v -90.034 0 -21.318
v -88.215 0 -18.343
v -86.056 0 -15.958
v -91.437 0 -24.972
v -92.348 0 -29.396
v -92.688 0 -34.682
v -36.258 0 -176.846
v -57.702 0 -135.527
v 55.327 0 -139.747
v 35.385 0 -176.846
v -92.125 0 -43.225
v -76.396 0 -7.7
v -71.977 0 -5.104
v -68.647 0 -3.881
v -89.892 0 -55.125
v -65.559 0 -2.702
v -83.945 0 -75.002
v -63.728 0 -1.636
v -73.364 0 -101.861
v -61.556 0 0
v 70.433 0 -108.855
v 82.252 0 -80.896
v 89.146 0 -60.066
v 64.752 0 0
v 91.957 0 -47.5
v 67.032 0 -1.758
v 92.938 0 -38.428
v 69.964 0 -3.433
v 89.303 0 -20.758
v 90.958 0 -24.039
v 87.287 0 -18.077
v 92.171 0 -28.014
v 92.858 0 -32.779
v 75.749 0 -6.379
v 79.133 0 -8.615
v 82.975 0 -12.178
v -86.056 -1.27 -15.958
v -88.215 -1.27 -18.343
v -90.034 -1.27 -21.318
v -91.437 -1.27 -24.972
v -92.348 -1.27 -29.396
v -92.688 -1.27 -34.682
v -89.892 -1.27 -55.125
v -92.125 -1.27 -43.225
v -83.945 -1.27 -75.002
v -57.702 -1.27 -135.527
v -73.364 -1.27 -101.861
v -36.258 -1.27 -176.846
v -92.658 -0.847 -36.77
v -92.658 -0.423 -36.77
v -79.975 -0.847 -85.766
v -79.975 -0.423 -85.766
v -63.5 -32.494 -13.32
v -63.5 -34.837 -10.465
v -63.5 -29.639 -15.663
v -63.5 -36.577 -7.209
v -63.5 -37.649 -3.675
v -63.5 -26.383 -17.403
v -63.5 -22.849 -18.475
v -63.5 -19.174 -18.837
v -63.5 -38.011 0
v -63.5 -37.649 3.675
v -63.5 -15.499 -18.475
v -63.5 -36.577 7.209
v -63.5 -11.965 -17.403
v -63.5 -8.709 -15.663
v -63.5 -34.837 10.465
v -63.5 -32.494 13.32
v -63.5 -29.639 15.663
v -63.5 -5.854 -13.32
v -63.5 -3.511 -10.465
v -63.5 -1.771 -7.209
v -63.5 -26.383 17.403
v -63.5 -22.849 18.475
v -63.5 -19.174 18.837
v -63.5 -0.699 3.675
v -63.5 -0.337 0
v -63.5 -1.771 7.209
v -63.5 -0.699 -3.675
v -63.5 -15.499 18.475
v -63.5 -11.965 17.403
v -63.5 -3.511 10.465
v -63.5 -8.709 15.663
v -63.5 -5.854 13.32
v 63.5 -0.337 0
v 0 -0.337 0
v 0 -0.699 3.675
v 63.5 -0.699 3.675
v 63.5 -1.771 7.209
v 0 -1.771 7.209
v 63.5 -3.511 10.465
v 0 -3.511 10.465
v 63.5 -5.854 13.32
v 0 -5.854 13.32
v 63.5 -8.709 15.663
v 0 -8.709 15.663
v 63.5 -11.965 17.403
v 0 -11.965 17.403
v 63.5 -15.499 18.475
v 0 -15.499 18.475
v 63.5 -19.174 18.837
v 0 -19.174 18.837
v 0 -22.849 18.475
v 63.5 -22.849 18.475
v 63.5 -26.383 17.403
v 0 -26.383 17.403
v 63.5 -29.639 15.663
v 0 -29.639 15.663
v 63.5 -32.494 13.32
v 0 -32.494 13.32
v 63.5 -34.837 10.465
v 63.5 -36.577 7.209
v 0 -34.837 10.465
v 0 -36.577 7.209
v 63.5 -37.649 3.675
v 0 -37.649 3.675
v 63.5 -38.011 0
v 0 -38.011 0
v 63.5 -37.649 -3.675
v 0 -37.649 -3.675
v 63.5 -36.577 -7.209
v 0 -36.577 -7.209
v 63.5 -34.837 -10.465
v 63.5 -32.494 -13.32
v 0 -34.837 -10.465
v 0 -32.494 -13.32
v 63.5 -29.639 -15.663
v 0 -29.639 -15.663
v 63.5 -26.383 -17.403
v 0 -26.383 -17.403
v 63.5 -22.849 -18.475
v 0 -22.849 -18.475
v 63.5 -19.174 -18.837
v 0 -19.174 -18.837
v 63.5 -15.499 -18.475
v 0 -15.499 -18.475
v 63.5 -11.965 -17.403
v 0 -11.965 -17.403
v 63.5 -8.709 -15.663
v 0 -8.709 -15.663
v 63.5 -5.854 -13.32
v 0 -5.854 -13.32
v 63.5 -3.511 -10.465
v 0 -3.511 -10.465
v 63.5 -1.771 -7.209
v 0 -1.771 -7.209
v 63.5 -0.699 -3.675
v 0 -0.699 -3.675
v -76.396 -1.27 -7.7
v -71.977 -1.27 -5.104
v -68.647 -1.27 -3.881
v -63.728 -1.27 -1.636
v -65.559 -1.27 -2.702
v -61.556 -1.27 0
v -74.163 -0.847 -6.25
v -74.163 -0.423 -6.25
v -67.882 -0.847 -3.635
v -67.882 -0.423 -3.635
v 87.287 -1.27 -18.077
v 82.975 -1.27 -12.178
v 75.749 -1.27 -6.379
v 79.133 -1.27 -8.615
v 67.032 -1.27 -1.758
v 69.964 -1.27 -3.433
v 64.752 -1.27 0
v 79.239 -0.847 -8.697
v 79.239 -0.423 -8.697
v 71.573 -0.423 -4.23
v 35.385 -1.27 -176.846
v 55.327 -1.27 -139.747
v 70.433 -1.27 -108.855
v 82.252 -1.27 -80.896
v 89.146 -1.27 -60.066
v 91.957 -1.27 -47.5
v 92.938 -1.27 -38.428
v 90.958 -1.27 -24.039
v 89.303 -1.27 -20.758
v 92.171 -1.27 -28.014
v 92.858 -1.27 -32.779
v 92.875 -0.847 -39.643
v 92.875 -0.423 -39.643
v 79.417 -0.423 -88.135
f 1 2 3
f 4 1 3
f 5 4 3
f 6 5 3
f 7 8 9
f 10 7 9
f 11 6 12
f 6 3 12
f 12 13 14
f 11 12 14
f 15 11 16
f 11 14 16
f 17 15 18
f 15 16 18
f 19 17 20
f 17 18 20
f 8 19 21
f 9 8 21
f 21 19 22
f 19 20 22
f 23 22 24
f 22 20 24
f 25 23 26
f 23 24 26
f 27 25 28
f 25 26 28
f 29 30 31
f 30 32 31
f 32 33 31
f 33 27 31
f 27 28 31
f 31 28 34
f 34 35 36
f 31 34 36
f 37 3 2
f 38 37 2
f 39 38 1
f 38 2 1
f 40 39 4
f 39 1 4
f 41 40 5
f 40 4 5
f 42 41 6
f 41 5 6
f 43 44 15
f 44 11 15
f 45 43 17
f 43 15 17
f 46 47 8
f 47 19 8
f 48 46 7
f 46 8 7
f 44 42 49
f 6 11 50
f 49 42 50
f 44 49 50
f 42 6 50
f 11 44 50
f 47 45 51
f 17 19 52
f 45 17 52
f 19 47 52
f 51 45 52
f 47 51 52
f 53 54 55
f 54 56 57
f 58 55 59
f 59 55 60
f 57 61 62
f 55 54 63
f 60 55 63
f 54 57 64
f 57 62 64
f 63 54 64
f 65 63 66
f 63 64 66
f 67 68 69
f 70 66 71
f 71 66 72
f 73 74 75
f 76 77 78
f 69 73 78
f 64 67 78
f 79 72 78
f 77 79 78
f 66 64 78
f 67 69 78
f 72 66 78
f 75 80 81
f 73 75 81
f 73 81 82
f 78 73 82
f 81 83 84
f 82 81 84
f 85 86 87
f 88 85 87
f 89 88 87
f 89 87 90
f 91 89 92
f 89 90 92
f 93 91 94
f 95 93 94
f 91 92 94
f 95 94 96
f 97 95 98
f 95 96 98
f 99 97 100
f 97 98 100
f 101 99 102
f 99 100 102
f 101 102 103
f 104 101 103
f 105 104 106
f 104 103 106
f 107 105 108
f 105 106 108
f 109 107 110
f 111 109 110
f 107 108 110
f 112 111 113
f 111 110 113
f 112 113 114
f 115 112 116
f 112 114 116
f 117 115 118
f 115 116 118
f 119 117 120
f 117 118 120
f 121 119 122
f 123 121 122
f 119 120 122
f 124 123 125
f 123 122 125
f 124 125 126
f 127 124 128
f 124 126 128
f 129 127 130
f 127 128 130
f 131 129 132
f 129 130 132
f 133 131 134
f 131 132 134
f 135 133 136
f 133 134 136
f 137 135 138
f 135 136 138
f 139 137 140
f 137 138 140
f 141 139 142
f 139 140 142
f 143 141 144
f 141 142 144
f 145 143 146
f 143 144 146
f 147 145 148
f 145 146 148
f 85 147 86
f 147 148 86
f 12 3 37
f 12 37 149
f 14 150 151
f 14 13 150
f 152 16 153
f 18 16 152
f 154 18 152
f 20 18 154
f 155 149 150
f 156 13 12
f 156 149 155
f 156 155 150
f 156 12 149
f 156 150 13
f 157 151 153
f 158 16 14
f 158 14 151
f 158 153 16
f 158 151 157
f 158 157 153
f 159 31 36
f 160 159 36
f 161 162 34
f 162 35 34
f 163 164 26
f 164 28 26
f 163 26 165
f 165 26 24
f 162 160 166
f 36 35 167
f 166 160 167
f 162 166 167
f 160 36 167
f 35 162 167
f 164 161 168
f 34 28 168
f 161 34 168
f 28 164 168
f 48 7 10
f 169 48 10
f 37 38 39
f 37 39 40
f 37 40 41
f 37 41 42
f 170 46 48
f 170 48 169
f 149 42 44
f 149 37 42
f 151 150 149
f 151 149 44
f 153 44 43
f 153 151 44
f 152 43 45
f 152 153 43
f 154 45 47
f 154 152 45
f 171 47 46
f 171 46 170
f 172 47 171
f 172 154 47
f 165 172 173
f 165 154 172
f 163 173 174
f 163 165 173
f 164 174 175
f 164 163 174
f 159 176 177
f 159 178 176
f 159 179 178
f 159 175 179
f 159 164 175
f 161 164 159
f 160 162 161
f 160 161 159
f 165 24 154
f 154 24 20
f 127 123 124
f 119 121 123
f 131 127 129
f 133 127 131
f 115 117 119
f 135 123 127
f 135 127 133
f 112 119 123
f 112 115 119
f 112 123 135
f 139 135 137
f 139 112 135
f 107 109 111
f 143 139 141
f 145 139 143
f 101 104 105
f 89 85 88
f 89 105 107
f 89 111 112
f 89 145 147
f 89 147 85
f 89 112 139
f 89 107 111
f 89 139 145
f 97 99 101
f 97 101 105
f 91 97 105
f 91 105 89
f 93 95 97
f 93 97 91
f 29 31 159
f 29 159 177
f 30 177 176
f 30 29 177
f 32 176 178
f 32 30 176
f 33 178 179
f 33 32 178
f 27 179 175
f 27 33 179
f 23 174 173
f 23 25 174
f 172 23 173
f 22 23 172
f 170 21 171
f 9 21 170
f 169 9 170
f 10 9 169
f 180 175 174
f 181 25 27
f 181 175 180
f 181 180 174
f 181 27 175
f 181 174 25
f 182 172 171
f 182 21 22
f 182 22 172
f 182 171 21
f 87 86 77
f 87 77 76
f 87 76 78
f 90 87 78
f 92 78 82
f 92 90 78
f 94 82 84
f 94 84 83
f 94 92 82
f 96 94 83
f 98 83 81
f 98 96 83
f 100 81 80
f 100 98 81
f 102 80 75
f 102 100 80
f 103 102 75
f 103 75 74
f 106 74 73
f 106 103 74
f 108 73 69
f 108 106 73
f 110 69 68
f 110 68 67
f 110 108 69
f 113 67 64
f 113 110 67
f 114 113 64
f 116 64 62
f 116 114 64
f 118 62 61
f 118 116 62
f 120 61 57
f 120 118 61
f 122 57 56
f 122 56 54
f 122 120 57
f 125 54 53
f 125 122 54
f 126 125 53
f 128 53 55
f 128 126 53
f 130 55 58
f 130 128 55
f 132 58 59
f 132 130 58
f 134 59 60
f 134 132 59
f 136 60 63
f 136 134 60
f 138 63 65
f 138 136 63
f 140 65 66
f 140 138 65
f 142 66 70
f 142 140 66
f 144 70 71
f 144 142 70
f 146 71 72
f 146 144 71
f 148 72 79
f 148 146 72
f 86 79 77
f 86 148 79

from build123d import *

# Parameters (mm, degrees)
F0_R      = 18.83724
F1_DEPTH  = 63.5
F1_FACE_R = 18.83724
F2_DEPTH  = 63.5
F4_DEPTH  = 1.27


with BuildPart() as f1:
    # F0 (on Right) → F1 (new body)
    with BuildSketch(Plane.YZ):
        with Locations((-19.173939, 0)):
            Circle(F0_R)
    extrude(amount=-F1_DEPTH)

    # F1_face (on face) → F2 (join)
    with BuildSketch(Plane(origin=(0, -19.173939, 0), x_dir=(0, 1, 0), z_dir=(1, 0, 0))):
        Circle(F1_FACE_R)
    extrude(amount=F2_DEPTH)


with BuildPart() as f4:
    # F3 (on Front) → F4 (new body)
    with BuildSketch(Plane.XZ):
        with BuildLine():
            Line((64.751944, 0), (-61.556005, 0))
            add(Edge.make_bspline(
                [(-61.556005, 0), (-61.032861, -11.019501), (-76.759099, -7.395711), (-86.056434, -15.957918)],
                knots=[0, 0, 0, 0, 76.80465, 76.80465, 76.80465, 76.80465], degree=3))
            add(Edge.make_bspline(
                [(-86.056434, -15.957918), (-98.384604, -27.311316), (-99.409165, -60.090726), (-36.257519, -176.846474)],
                knots=[76.80465, 76.80465, 76.80465, 76.80465, 178.646826, 178.646826, 178.646826, 178.646826], degree=3))
            Line((-36.257519, -176.846474), (35.385492, -176.846474))
            add(Edge.make_bspline(
                [(87.287053, -18.077033), (98.55626, -30.61174), (98.545469, -63.593864), (35.385492, -176.846474)],
                knots=[75.70393, 75.70393, 75.70393, 75.70393, 179.268134, 179.268134, 179.268134, 179.268134], degree=3))
            add(Edge.make_bspline(
                [(64.751944, 0), (64.784448, -10.677522), (79.049427, -8.914343), (87.287053, -18.077033)],
                knots=[0, 0, 0, 0, 75.70393, 75.70393, 75.70393, 75.70393], degree=3))
        make_face()
        with BuildLine():
            add(Edge.make_bspline(
                [(-61.556005, 0), (-61.032861, -11.019501), (-76.759099, -7.395711), (-86.056434, -15.957918)],
                knots=[0, 0, 0, 0, 76.80465, 76.80465, 76.80465, 76.80465], degree=3))
            add(Edge.make_bspline(
                [(-86.056434, -15.957918), (-69.472371, 0), (-69.788494, -6.848962), (-61.556005, 0)],
                knots=[0, 0, 0, 0, 29.23912, 29.23912, 29.23912, 29.23912], degree=3))
        make_face()
        with BuildLine():
            add(Edge.make_bspline(
                [(87.287053, -18.077033), (79.203186, -4.681891), (70.994788, -5.671044), (64.751944, 0)],
                knots=[0, 0, 0, 0, 28.889622, 28.889622, 28.889622, 28.889622], degree=3))
            add(Edge.make_bspline(
                [(64.751944, 0), (64.784448, -10.677522), (79.049427, -8.914343), (87.287053, -18.077033)],
                knots=[0, 0, 0, 0, 75.70393, 75.70393, 75.70393, 75.70393], degree=3))
        make_face()
    extrude(amount=F4_DEPTH)


solid = Compound([f1.part, f4.part])
